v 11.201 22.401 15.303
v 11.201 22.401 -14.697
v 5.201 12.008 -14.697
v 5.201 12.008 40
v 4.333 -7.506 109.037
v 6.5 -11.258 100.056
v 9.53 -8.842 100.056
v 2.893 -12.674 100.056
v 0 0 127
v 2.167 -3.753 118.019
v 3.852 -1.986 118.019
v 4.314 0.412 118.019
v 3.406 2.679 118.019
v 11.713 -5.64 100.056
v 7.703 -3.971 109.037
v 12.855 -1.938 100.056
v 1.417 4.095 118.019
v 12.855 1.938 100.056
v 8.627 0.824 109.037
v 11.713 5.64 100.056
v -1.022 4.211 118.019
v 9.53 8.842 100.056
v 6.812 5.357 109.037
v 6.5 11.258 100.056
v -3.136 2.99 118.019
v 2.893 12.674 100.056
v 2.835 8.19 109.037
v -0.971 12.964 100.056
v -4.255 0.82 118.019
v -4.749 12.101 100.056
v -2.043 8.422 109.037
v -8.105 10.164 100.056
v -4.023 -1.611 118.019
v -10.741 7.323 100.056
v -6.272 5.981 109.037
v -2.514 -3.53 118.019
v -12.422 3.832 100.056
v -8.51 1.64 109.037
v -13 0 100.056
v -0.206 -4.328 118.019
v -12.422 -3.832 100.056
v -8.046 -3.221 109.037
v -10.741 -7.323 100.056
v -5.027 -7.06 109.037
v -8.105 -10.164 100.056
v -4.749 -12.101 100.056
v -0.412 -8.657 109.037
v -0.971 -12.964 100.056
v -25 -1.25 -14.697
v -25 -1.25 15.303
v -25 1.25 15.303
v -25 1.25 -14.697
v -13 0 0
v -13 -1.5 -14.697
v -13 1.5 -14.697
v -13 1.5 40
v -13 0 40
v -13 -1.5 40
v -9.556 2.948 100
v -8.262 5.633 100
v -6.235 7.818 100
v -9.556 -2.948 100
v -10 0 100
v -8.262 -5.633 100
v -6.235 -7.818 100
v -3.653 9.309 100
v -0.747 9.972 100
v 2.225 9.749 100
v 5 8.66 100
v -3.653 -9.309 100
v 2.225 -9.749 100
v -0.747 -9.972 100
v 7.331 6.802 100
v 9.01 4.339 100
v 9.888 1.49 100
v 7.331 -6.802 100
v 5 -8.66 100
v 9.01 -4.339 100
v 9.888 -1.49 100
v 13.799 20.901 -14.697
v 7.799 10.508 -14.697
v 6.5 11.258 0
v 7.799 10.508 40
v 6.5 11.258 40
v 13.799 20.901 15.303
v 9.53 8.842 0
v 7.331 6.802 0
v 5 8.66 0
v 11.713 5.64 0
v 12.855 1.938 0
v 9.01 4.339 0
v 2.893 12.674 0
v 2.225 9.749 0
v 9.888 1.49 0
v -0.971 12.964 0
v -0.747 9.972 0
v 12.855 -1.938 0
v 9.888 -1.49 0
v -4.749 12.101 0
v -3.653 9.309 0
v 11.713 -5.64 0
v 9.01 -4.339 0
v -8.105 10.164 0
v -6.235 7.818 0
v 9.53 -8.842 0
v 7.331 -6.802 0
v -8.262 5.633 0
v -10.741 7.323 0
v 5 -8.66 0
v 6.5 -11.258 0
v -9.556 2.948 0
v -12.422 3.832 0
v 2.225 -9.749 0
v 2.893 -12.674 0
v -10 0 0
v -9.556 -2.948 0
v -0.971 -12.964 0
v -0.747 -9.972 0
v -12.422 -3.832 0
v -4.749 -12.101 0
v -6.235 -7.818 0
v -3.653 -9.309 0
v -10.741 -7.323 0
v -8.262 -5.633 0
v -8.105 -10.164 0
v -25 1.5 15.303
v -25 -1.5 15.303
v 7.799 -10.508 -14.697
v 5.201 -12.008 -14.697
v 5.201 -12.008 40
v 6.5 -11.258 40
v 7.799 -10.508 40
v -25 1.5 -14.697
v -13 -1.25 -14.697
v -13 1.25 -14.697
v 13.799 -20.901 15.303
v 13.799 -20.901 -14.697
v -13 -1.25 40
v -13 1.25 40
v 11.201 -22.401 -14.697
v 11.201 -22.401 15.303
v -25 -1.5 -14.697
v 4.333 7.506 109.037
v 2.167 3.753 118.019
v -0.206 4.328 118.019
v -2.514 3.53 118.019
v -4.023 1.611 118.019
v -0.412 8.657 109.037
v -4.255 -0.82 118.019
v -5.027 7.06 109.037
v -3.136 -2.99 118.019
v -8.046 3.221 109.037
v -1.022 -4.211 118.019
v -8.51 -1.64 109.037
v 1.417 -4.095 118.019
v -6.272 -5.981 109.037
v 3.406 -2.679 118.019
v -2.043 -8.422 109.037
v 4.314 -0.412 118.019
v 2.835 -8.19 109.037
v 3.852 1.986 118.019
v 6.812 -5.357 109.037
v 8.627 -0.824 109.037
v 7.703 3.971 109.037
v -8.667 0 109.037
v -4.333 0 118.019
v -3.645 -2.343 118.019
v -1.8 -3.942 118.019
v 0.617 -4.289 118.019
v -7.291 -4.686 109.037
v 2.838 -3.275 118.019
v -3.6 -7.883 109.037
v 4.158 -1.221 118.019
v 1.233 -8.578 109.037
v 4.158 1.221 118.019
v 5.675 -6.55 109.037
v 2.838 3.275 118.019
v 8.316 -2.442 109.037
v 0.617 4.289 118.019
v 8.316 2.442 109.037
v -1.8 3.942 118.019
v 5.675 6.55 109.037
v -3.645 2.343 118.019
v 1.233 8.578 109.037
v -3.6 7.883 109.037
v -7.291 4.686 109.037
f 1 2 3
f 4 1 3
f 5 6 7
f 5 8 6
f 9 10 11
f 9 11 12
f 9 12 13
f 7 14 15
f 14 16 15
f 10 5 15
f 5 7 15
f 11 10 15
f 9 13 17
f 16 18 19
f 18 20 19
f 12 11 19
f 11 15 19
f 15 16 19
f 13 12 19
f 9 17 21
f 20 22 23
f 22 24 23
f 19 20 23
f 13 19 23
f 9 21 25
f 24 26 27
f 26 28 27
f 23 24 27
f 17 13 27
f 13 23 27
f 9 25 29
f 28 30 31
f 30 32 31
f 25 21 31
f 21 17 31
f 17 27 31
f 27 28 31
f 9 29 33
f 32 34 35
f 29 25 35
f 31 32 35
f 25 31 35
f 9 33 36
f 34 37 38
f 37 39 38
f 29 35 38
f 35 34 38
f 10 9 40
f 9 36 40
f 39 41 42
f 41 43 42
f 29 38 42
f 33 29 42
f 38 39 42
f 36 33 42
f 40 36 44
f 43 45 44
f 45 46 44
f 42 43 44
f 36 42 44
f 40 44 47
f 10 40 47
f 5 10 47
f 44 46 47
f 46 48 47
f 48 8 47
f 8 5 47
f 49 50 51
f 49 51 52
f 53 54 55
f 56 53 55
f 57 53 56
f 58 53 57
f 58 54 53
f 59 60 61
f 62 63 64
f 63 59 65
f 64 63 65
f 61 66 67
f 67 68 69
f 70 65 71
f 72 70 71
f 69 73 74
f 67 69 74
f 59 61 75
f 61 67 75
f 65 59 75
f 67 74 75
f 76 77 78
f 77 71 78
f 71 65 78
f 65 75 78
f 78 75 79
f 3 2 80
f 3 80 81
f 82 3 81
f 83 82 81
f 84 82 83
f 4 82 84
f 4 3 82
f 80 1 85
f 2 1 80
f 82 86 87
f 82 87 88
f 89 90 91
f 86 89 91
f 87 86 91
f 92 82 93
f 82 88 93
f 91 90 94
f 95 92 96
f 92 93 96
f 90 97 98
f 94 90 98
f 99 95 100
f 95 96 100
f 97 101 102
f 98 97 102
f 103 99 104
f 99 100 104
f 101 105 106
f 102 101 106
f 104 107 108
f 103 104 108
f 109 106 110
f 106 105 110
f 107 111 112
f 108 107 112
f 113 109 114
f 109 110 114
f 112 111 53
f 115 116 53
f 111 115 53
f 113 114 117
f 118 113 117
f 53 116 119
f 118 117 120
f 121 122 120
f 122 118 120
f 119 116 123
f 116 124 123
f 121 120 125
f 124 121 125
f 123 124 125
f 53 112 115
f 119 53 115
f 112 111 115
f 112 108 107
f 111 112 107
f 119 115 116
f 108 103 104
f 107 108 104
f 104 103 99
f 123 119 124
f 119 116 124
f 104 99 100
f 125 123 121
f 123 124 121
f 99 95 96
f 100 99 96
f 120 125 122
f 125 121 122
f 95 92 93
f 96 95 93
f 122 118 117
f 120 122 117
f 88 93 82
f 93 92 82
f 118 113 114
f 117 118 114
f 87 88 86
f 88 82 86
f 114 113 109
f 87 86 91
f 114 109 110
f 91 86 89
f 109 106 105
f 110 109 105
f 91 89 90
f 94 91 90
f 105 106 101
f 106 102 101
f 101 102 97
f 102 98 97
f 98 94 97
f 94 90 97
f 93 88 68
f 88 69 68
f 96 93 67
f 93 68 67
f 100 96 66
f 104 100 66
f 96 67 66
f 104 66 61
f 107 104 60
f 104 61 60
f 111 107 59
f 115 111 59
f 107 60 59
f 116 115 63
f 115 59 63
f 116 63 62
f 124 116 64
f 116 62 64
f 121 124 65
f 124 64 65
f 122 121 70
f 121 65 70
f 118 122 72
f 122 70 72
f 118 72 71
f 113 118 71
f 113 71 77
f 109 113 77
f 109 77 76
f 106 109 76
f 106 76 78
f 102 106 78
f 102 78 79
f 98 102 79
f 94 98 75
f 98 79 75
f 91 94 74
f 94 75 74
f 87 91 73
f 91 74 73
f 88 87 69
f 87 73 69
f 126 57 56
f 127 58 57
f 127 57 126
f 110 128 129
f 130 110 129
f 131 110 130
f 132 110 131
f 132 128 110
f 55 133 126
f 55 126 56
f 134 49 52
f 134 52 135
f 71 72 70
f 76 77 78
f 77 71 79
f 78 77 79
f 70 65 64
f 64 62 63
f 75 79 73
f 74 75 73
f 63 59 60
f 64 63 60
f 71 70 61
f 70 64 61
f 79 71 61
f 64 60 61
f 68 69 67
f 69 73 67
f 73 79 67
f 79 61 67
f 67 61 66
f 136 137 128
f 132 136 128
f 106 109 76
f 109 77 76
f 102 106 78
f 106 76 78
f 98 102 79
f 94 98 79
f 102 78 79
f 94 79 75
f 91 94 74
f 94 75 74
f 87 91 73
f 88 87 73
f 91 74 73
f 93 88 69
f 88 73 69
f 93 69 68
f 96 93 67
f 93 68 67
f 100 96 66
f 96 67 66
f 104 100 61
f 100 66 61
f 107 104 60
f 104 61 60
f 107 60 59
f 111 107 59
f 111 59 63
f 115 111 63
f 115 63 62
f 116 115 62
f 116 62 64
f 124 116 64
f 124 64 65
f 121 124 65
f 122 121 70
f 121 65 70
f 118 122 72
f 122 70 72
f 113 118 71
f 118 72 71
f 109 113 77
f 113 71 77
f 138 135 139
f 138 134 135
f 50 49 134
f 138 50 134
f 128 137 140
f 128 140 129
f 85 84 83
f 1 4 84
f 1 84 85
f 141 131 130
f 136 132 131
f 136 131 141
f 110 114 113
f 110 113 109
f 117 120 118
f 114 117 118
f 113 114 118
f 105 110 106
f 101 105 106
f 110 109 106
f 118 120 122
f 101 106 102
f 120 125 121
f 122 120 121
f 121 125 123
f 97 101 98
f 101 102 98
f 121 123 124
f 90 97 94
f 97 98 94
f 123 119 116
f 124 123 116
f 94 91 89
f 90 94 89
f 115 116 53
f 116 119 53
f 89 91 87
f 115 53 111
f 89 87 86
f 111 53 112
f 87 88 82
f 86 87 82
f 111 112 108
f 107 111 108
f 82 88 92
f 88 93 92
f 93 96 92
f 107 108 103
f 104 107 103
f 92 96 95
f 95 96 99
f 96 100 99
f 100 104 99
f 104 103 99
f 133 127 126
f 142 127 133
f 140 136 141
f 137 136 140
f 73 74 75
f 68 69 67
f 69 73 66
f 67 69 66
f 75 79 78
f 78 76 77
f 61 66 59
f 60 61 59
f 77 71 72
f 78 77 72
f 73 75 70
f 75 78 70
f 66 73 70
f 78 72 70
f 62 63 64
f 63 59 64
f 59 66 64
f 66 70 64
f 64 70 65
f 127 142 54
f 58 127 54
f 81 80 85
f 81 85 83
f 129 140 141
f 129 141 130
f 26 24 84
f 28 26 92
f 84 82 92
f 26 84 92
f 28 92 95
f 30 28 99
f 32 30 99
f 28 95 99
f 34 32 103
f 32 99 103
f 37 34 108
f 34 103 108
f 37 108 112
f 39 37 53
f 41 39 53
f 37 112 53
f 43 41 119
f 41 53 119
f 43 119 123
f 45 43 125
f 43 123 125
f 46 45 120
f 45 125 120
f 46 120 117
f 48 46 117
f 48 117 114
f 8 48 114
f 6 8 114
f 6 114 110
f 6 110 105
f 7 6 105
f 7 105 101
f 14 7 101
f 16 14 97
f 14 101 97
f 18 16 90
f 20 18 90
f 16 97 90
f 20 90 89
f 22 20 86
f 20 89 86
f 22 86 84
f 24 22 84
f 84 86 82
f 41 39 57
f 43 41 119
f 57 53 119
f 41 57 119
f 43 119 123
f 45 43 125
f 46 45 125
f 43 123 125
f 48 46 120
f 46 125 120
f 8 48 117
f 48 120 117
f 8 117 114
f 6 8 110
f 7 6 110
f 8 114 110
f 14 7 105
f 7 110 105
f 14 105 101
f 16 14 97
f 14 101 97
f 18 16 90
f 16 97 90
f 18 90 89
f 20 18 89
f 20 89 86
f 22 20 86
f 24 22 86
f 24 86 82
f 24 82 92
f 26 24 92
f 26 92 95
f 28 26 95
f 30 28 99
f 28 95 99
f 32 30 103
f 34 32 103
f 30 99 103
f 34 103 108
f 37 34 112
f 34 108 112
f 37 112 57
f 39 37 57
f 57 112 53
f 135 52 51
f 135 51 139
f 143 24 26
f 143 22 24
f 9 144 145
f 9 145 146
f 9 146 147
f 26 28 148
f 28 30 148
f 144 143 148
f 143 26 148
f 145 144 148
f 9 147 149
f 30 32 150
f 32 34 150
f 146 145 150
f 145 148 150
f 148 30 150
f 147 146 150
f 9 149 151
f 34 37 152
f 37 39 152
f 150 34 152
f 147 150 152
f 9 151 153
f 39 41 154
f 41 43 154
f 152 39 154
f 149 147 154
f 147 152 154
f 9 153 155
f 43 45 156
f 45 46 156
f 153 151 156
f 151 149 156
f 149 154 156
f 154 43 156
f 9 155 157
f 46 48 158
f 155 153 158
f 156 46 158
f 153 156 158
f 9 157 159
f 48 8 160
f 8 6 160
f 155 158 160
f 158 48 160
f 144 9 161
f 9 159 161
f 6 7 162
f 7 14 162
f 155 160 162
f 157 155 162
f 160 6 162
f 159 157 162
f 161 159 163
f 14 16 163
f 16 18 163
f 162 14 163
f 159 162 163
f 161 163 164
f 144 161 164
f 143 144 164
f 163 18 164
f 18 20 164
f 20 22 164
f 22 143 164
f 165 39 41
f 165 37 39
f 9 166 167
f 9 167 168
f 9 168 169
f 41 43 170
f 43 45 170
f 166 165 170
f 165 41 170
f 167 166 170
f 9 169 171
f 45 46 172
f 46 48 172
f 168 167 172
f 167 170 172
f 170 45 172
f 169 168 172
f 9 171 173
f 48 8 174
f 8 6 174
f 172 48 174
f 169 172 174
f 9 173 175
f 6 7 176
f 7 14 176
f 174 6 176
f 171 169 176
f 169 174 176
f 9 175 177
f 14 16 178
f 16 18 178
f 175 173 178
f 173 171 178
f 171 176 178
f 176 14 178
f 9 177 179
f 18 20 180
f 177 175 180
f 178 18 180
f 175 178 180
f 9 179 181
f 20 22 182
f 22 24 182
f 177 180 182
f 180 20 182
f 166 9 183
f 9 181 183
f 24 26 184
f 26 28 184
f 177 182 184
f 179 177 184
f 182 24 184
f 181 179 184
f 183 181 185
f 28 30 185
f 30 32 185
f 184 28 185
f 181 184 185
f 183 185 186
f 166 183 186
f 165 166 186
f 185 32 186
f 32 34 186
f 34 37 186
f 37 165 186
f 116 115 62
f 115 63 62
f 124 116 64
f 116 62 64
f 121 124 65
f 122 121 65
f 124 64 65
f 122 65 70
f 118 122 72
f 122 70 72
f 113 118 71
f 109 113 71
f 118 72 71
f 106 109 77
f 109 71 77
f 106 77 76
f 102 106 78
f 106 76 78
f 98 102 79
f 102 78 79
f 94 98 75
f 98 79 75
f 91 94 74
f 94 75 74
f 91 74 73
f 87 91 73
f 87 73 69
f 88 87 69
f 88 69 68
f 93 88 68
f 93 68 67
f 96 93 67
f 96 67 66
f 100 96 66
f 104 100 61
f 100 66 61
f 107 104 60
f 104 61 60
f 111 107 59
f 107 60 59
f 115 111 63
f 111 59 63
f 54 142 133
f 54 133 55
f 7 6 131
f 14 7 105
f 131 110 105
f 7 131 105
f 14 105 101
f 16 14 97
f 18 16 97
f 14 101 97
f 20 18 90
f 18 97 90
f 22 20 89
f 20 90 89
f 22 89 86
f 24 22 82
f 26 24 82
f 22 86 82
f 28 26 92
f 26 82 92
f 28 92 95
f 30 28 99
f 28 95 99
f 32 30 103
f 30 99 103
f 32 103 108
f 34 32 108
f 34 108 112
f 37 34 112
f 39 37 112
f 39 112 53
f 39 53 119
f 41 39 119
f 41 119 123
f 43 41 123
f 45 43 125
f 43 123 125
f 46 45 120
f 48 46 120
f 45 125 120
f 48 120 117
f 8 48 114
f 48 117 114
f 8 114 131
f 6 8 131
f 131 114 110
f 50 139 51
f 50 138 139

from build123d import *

# Parameters (mm, degrees)
F3_DEPTH = 1.5
F4_COUNT = 3
F5_DEPTH = 1.25


with BuildPart() as f1:
    # F0 (on Front) → F1 (revolve)
    with BuildSketch(Plane.XZ):
        Polygon((-10, 100), (0, 100), (0, 127), (-13, 100.0556262038), (-13, 0), (-10, 0), align=None)
    revolve(axis=Axis((0, 0, 63.5), (0, 0, 1)))

    # F2 (on Front) → F3 (join, symmetric)
    with BuildSketch(Plane.XZ):
        Polygon((-13, 40), (-25, 15.3033933416), (-25, -14.6966066584), (-13, -14.6966066584), (-13, -4.6966066584), align=None)
    extrude(amount=F3_DEPTH, both=True)


with BuildPart() as f4_1:
    # F4: instance of F1
    add(f1.part.rotate(Axis((0, 0, 100.0556262038), (0, 0, -1)), 1 * 360 / F4_COUNT))


with BuildPart() as f4_2:
    # F4: instance of F1
    add(f1.part.rotate(Axis((0, 0, 100.0556262038), (0, 0, -1)), 2 * 360 / F4_COUNT))


with BuildPart() as f5:
    # F2 (on Front) → F5 (new body, symmetric)
    with BuildSketch(Plane.XZ):
        Polygon((-13, 40), (-25, 15.3033933416), (-25, -14.6966066584), (-13, -14.6966066584), (-13, -4.6966066584), align=None)
    extrude(amount=F5_DEPTH, both=True)


solid = Compound([f1.part, f4_1.part, f4_2.part, f5.part])
